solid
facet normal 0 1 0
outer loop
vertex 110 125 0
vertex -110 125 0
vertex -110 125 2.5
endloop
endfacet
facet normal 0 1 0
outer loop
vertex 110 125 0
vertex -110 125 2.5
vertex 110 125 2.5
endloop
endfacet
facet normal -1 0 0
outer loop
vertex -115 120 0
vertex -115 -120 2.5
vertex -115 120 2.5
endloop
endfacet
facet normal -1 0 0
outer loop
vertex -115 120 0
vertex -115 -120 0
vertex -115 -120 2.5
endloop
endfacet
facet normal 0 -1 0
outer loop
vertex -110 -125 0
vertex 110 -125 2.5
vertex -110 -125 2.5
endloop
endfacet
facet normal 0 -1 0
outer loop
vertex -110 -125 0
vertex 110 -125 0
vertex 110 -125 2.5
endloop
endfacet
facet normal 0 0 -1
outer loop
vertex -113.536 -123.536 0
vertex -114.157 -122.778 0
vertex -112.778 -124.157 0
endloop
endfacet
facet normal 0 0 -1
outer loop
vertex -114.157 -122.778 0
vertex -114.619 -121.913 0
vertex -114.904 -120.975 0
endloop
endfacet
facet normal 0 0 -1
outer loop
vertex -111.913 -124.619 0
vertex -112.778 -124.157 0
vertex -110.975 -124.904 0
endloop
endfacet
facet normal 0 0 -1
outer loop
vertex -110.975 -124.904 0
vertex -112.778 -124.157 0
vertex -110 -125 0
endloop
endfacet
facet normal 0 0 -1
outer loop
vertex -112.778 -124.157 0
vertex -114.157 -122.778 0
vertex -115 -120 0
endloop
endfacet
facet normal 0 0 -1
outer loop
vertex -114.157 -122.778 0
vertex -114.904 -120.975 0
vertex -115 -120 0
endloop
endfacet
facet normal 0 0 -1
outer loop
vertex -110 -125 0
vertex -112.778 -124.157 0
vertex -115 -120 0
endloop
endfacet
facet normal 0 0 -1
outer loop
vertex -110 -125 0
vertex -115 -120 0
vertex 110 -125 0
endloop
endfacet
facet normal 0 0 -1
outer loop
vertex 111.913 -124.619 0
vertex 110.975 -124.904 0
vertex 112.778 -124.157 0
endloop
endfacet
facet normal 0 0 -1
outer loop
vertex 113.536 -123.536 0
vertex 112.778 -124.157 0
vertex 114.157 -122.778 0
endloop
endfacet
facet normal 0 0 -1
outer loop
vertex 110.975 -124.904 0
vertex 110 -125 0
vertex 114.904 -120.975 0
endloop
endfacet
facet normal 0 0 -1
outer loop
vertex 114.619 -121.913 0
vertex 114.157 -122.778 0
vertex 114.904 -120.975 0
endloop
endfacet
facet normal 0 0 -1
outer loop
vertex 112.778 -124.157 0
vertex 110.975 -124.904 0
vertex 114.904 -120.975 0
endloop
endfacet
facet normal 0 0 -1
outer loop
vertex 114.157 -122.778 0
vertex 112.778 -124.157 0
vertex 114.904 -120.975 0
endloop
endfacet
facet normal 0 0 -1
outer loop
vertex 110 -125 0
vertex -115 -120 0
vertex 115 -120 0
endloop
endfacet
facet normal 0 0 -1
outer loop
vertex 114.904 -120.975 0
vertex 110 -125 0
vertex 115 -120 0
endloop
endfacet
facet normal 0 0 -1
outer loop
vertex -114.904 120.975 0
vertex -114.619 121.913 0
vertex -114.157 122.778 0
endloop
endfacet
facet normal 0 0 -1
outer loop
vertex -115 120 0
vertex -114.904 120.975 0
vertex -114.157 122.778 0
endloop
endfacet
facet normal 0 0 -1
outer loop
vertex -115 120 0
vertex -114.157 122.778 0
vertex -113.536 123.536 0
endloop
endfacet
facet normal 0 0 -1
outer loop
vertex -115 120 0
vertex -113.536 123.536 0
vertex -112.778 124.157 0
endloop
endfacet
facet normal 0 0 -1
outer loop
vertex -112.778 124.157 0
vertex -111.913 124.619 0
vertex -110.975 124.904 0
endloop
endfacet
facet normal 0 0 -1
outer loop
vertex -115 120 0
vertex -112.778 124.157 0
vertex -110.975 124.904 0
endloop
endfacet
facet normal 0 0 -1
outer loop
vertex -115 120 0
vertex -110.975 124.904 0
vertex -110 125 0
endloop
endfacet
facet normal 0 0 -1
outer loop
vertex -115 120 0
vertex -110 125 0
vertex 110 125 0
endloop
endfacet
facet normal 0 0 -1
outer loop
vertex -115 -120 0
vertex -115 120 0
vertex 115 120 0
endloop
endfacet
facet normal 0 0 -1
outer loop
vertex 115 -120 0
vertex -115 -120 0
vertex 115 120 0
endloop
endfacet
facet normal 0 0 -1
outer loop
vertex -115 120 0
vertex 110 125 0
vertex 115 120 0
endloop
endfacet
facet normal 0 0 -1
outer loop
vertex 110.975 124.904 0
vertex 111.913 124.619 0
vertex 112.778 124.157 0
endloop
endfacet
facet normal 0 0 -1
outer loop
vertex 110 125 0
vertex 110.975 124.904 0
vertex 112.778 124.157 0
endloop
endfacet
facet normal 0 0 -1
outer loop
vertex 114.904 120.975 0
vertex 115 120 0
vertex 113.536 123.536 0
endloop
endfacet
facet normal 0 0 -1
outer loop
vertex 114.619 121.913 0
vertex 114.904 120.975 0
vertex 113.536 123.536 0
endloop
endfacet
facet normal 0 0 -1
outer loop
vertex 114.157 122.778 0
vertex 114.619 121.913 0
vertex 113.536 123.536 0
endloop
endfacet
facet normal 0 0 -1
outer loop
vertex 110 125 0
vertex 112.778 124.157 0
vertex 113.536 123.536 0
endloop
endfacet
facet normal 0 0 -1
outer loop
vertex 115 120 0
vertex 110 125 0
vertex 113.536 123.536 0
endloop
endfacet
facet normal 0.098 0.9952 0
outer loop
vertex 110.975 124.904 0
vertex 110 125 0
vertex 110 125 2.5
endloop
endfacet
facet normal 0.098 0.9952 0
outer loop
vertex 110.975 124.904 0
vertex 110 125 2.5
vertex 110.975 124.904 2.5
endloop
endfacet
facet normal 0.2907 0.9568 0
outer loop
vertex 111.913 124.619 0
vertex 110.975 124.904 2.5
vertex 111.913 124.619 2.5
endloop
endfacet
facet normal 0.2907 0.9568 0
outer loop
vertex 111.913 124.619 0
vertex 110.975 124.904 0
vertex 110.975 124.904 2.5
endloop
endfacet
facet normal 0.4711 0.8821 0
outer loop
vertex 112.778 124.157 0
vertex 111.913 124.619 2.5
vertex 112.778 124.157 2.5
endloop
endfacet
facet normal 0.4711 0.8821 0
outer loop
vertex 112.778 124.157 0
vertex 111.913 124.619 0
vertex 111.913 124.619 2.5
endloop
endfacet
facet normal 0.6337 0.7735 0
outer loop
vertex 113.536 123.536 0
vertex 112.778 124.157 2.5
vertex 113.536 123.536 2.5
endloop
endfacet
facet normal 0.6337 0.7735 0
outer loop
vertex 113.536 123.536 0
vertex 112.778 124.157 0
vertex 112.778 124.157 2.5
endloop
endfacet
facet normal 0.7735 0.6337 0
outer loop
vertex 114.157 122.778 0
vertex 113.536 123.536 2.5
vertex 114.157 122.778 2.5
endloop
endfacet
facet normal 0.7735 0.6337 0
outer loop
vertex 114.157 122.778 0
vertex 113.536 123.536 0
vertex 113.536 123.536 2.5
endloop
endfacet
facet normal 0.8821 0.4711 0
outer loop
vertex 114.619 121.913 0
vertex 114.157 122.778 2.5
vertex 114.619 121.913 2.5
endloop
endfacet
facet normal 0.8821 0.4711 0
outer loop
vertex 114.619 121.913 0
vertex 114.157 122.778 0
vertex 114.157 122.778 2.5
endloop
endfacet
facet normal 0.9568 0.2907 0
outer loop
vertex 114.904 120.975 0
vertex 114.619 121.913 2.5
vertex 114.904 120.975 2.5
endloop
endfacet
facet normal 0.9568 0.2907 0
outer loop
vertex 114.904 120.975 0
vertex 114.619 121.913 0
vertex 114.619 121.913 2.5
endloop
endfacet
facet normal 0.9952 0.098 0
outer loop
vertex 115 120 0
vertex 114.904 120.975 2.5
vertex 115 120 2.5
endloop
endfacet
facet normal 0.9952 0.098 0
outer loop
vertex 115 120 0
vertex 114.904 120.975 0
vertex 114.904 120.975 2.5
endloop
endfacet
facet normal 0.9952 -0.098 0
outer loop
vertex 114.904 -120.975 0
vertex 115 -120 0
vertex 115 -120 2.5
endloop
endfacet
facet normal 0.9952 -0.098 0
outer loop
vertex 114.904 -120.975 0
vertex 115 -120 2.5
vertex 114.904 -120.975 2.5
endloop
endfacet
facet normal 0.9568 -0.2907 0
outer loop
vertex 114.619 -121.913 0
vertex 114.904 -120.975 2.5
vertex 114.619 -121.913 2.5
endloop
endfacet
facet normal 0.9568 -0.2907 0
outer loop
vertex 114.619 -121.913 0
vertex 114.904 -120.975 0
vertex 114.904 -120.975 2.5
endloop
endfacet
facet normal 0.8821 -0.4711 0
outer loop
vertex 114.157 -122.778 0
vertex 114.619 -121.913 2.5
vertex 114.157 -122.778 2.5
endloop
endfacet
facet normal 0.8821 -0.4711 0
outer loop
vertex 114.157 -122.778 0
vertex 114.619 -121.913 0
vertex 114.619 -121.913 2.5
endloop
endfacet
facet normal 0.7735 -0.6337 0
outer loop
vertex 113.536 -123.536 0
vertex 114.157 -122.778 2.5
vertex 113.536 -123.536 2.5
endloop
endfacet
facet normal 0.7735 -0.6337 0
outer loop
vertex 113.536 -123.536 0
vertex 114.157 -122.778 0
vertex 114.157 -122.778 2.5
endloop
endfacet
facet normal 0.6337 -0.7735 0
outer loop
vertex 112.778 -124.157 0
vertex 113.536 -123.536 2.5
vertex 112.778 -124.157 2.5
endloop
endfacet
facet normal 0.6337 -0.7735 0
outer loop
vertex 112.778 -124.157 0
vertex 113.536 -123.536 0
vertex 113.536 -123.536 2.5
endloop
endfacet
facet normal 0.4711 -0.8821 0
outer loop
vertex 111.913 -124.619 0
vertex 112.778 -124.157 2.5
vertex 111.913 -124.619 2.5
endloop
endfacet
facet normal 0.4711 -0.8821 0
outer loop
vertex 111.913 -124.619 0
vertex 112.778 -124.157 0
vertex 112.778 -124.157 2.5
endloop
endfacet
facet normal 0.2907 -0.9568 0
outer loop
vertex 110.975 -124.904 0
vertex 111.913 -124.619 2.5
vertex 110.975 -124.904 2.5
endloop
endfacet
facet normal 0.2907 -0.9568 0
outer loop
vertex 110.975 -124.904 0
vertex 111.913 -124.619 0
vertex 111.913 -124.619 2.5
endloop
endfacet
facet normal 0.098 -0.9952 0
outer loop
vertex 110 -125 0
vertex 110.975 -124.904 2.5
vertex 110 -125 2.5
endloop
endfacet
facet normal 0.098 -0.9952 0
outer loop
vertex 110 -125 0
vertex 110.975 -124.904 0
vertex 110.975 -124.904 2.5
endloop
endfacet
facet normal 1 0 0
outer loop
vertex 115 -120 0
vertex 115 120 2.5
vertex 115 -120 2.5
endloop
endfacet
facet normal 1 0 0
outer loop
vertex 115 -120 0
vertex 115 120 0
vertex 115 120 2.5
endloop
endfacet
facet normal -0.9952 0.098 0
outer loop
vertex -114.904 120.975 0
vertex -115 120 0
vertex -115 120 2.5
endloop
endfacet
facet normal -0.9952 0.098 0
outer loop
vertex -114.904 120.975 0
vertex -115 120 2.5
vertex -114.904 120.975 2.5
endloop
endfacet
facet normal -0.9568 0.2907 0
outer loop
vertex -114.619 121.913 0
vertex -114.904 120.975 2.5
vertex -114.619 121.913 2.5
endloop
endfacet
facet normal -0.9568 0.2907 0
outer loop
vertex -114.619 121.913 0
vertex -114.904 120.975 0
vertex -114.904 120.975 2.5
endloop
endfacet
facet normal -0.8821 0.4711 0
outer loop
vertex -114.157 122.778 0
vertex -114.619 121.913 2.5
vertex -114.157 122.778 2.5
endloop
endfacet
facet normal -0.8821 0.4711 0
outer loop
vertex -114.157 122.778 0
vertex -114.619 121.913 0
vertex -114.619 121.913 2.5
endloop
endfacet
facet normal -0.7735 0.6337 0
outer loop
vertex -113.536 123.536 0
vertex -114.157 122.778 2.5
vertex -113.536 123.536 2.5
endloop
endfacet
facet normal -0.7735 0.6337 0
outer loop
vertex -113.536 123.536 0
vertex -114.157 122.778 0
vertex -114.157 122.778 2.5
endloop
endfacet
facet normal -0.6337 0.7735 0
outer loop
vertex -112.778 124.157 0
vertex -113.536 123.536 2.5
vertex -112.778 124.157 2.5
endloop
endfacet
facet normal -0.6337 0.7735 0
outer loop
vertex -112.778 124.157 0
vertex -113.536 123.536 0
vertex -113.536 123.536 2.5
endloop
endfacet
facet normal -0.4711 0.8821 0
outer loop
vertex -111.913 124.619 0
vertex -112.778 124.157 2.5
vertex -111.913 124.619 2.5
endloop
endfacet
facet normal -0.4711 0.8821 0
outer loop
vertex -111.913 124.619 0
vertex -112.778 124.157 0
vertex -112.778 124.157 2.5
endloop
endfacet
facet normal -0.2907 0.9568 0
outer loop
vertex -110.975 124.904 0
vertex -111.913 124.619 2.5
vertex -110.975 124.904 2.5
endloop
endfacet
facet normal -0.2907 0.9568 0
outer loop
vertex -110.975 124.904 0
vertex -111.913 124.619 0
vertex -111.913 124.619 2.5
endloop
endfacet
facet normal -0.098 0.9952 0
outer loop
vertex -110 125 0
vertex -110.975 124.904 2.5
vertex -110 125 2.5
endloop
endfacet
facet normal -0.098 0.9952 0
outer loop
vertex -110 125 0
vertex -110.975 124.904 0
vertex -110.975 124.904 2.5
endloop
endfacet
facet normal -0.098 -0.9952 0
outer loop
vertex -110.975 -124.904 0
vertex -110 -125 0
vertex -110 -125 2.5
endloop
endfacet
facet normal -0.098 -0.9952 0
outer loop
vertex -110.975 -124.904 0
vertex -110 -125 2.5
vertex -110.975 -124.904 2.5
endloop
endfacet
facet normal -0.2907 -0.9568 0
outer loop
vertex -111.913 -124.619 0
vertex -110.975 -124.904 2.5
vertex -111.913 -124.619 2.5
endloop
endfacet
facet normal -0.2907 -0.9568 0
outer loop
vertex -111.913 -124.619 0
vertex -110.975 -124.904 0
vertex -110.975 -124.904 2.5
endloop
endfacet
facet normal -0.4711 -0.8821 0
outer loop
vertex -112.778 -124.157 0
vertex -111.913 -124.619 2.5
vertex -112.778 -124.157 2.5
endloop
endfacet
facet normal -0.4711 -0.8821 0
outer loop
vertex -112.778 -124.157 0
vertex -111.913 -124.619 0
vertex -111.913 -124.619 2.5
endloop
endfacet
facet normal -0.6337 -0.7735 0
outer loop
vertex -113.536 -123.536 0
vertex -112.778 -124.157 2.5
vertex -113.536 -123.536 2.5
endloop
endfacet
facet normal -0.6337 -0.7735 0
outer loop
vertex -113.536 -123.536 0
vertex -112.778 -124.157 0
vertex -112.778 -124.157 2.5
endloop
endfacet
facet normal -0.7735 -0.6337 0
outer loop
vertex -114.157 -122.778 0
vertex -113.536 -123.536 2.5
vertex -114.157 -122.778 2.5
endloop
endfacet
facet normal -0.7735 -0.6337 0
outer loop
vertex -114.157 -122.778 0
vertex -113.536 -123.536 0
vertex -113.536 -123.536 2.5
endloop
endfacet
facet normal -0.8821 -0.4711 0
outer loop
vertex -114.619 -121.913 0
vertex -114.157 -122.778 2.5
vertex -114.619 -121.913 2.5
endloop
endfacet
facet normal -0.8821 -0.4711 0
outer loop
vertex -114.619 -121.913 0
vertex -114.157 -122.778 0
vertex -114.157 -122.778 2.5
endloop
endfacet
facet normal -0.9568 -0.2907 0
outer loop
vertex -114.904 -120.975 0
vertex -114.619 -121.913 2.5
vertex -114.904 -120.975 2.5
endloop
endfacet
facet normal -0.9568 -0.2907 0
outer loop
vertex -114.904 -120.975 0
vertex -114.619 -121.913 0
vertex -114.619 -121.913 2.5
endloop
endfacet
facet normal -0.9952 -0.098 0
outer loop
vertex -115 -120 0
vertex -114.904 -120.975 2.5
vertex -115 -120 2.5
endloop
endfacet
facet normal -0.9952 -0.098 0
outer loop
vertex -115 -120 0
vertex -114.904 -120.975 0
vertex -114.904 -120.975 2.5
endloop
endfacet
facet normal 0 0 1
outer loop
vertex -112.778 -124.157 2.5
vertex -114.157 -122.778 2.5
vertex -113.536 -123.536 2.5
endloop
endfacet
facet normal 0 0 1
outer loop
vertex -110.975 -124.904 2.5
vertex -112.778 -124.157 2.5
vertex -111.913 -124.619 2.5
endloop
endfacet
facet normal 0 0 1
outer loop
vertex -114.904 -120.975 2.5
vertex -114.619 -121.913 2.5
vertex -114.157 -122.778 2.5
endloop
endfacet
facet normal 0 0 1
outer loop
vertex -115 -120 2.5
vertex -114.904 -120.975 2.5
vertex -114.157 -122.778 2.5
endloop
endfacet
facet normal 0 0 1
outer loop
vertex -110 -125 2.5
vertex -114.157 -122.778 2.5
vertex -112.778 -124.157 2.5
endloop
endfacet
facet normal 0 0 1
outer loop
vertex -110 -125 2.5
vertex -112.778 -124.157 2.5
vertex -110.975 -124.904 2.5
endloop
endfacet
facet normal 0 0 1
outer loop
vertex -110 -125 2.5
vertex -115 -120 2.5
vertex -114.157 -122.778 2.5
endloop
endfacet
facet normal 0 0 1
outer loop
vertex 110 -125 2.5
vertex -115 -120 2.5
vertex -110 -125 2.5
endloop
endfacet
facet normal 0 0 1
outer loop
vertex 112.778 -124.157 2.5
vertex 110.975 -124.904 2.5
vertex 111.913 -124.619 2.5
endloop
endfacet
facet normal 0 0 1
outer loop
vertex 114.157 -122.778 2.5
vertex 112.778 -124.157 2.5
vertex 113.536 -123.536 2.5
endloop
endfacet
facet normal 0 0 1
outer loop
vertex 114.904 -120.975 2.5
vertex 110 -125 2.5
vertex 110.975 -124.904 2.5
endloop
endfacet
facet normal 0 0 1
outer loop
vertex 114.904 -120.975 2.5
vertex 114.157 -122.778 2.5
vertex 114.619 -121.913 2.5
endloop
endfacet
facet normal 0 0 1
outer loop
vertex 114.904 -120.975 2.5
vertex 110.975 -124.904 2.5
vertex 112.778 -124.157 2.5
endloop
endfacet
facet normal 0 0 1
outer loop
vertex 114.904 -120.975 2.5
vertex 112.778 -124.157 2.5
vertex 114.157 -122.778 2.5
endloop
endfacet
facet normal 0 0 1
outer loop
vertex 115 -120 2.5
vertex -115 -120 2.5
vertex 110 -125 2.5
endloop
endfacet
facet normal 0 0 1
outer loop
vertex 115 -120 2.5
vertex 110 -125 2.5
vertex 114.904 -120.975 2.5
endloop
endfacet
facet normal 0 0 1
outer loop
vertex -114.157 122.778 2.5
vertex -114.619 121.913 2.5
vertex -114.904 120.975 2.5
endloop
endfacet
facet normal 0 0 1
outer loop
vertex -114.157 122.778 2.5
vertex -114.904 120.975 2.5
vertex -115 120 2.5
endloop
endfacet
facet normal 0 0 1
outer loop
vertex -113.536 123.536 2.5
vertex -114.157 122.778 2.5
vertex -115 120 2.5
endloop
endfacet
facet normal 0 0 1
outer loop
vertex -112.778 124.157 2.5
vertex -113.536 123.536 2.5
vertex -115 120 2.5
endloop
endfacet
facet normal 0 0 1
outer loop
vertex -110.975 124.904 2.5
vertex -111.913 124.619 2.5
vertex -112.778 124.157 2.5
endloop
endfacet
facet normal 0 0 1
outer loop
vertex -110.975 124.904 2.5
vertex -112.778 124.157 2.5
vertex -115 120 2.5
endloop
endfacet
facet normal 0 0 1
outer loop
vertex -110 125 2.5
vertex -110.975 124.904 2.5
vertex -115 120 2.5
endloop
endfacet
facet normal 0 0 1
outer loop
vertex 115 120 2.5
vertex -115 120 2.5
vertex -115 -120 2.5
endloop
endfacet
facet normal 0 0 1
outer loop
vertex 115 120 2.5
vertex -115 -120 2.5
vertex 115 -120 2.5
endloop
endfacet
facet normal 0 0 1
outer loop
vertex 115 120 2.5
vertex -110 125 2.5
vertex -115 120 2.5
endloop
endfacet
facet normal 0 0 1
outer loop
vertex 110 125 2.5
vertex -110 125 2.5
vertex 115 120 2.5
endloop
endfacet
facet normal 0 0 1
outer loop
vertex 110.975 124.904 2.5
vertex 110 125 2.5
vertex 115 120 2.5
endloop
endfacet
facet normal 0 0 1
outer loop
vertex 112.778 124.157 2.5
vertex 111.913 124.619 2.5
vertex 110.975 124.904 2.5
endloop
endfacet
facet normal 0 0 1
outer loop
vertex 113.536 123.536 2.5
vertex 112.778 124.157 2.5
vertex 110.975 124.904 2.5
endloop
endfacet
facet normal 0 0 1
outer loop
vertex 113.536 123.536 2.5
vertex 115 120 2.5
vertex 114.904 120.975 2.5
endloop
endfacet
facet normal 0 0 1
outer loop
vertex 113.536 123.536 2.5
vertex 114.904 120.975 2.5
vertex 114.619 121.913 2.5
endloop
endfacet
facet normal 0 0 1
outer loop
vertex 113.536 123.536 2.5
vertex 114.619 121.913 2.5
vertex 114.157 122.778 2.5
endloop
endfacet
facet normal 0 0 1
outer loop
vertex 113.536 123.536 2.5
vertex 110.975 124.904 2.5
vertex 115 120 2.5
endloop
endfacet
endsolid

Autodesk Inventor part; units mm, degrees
ref_plane "YZ Plane" through (0, 0, 0) normal (1, 0, 0) x (0, 1, 0)
ref_plane "XZ Plane" through (0, 0, 0) normal (0, 1, 0) x (-1, 0, 0)
ref_plane "XY Plane" through (0, 0, 0) normal (0, 0, 1) x (1, 0, 0)
sketch "Sketch1" plane through (0, 0, 0) normal (0, 0, 1) x (1, 0, 0)
  line L0 (-110, 125) -> (110, 125)
  line L1 (115, 120) -> (115, -120)
  line L2 (110, -125) -> (-110, -125)
  line L3 (-115, -120) -> (-115, 120)
  line L4 (-115, 125) -> (115, -125) construction
  line L5 (115, 125) -> (-115, -125) construction
  arc A0 (-110, 125) -> (-115, 120) centre (-110, 120) ccw
  arc A1 (115, 120) -> (110, 125) centre (110, 120) ccw
  arc A2 (110, -125) -> (115, -120) centre (110, -120) ccw
  arc A3 (-115, -120) -> (-110, -125) centre (-110, -120) ccw
  point P0 (0, 0)
  dimension "d0" = 230
  dimension "d1" = 250
  dimension "d2" = 5
extrude "Extrusion1" add sketch "Sketch1" along normal blind 2.5
properties part number "BatteryPlate" material "Steel, Galvanized"
